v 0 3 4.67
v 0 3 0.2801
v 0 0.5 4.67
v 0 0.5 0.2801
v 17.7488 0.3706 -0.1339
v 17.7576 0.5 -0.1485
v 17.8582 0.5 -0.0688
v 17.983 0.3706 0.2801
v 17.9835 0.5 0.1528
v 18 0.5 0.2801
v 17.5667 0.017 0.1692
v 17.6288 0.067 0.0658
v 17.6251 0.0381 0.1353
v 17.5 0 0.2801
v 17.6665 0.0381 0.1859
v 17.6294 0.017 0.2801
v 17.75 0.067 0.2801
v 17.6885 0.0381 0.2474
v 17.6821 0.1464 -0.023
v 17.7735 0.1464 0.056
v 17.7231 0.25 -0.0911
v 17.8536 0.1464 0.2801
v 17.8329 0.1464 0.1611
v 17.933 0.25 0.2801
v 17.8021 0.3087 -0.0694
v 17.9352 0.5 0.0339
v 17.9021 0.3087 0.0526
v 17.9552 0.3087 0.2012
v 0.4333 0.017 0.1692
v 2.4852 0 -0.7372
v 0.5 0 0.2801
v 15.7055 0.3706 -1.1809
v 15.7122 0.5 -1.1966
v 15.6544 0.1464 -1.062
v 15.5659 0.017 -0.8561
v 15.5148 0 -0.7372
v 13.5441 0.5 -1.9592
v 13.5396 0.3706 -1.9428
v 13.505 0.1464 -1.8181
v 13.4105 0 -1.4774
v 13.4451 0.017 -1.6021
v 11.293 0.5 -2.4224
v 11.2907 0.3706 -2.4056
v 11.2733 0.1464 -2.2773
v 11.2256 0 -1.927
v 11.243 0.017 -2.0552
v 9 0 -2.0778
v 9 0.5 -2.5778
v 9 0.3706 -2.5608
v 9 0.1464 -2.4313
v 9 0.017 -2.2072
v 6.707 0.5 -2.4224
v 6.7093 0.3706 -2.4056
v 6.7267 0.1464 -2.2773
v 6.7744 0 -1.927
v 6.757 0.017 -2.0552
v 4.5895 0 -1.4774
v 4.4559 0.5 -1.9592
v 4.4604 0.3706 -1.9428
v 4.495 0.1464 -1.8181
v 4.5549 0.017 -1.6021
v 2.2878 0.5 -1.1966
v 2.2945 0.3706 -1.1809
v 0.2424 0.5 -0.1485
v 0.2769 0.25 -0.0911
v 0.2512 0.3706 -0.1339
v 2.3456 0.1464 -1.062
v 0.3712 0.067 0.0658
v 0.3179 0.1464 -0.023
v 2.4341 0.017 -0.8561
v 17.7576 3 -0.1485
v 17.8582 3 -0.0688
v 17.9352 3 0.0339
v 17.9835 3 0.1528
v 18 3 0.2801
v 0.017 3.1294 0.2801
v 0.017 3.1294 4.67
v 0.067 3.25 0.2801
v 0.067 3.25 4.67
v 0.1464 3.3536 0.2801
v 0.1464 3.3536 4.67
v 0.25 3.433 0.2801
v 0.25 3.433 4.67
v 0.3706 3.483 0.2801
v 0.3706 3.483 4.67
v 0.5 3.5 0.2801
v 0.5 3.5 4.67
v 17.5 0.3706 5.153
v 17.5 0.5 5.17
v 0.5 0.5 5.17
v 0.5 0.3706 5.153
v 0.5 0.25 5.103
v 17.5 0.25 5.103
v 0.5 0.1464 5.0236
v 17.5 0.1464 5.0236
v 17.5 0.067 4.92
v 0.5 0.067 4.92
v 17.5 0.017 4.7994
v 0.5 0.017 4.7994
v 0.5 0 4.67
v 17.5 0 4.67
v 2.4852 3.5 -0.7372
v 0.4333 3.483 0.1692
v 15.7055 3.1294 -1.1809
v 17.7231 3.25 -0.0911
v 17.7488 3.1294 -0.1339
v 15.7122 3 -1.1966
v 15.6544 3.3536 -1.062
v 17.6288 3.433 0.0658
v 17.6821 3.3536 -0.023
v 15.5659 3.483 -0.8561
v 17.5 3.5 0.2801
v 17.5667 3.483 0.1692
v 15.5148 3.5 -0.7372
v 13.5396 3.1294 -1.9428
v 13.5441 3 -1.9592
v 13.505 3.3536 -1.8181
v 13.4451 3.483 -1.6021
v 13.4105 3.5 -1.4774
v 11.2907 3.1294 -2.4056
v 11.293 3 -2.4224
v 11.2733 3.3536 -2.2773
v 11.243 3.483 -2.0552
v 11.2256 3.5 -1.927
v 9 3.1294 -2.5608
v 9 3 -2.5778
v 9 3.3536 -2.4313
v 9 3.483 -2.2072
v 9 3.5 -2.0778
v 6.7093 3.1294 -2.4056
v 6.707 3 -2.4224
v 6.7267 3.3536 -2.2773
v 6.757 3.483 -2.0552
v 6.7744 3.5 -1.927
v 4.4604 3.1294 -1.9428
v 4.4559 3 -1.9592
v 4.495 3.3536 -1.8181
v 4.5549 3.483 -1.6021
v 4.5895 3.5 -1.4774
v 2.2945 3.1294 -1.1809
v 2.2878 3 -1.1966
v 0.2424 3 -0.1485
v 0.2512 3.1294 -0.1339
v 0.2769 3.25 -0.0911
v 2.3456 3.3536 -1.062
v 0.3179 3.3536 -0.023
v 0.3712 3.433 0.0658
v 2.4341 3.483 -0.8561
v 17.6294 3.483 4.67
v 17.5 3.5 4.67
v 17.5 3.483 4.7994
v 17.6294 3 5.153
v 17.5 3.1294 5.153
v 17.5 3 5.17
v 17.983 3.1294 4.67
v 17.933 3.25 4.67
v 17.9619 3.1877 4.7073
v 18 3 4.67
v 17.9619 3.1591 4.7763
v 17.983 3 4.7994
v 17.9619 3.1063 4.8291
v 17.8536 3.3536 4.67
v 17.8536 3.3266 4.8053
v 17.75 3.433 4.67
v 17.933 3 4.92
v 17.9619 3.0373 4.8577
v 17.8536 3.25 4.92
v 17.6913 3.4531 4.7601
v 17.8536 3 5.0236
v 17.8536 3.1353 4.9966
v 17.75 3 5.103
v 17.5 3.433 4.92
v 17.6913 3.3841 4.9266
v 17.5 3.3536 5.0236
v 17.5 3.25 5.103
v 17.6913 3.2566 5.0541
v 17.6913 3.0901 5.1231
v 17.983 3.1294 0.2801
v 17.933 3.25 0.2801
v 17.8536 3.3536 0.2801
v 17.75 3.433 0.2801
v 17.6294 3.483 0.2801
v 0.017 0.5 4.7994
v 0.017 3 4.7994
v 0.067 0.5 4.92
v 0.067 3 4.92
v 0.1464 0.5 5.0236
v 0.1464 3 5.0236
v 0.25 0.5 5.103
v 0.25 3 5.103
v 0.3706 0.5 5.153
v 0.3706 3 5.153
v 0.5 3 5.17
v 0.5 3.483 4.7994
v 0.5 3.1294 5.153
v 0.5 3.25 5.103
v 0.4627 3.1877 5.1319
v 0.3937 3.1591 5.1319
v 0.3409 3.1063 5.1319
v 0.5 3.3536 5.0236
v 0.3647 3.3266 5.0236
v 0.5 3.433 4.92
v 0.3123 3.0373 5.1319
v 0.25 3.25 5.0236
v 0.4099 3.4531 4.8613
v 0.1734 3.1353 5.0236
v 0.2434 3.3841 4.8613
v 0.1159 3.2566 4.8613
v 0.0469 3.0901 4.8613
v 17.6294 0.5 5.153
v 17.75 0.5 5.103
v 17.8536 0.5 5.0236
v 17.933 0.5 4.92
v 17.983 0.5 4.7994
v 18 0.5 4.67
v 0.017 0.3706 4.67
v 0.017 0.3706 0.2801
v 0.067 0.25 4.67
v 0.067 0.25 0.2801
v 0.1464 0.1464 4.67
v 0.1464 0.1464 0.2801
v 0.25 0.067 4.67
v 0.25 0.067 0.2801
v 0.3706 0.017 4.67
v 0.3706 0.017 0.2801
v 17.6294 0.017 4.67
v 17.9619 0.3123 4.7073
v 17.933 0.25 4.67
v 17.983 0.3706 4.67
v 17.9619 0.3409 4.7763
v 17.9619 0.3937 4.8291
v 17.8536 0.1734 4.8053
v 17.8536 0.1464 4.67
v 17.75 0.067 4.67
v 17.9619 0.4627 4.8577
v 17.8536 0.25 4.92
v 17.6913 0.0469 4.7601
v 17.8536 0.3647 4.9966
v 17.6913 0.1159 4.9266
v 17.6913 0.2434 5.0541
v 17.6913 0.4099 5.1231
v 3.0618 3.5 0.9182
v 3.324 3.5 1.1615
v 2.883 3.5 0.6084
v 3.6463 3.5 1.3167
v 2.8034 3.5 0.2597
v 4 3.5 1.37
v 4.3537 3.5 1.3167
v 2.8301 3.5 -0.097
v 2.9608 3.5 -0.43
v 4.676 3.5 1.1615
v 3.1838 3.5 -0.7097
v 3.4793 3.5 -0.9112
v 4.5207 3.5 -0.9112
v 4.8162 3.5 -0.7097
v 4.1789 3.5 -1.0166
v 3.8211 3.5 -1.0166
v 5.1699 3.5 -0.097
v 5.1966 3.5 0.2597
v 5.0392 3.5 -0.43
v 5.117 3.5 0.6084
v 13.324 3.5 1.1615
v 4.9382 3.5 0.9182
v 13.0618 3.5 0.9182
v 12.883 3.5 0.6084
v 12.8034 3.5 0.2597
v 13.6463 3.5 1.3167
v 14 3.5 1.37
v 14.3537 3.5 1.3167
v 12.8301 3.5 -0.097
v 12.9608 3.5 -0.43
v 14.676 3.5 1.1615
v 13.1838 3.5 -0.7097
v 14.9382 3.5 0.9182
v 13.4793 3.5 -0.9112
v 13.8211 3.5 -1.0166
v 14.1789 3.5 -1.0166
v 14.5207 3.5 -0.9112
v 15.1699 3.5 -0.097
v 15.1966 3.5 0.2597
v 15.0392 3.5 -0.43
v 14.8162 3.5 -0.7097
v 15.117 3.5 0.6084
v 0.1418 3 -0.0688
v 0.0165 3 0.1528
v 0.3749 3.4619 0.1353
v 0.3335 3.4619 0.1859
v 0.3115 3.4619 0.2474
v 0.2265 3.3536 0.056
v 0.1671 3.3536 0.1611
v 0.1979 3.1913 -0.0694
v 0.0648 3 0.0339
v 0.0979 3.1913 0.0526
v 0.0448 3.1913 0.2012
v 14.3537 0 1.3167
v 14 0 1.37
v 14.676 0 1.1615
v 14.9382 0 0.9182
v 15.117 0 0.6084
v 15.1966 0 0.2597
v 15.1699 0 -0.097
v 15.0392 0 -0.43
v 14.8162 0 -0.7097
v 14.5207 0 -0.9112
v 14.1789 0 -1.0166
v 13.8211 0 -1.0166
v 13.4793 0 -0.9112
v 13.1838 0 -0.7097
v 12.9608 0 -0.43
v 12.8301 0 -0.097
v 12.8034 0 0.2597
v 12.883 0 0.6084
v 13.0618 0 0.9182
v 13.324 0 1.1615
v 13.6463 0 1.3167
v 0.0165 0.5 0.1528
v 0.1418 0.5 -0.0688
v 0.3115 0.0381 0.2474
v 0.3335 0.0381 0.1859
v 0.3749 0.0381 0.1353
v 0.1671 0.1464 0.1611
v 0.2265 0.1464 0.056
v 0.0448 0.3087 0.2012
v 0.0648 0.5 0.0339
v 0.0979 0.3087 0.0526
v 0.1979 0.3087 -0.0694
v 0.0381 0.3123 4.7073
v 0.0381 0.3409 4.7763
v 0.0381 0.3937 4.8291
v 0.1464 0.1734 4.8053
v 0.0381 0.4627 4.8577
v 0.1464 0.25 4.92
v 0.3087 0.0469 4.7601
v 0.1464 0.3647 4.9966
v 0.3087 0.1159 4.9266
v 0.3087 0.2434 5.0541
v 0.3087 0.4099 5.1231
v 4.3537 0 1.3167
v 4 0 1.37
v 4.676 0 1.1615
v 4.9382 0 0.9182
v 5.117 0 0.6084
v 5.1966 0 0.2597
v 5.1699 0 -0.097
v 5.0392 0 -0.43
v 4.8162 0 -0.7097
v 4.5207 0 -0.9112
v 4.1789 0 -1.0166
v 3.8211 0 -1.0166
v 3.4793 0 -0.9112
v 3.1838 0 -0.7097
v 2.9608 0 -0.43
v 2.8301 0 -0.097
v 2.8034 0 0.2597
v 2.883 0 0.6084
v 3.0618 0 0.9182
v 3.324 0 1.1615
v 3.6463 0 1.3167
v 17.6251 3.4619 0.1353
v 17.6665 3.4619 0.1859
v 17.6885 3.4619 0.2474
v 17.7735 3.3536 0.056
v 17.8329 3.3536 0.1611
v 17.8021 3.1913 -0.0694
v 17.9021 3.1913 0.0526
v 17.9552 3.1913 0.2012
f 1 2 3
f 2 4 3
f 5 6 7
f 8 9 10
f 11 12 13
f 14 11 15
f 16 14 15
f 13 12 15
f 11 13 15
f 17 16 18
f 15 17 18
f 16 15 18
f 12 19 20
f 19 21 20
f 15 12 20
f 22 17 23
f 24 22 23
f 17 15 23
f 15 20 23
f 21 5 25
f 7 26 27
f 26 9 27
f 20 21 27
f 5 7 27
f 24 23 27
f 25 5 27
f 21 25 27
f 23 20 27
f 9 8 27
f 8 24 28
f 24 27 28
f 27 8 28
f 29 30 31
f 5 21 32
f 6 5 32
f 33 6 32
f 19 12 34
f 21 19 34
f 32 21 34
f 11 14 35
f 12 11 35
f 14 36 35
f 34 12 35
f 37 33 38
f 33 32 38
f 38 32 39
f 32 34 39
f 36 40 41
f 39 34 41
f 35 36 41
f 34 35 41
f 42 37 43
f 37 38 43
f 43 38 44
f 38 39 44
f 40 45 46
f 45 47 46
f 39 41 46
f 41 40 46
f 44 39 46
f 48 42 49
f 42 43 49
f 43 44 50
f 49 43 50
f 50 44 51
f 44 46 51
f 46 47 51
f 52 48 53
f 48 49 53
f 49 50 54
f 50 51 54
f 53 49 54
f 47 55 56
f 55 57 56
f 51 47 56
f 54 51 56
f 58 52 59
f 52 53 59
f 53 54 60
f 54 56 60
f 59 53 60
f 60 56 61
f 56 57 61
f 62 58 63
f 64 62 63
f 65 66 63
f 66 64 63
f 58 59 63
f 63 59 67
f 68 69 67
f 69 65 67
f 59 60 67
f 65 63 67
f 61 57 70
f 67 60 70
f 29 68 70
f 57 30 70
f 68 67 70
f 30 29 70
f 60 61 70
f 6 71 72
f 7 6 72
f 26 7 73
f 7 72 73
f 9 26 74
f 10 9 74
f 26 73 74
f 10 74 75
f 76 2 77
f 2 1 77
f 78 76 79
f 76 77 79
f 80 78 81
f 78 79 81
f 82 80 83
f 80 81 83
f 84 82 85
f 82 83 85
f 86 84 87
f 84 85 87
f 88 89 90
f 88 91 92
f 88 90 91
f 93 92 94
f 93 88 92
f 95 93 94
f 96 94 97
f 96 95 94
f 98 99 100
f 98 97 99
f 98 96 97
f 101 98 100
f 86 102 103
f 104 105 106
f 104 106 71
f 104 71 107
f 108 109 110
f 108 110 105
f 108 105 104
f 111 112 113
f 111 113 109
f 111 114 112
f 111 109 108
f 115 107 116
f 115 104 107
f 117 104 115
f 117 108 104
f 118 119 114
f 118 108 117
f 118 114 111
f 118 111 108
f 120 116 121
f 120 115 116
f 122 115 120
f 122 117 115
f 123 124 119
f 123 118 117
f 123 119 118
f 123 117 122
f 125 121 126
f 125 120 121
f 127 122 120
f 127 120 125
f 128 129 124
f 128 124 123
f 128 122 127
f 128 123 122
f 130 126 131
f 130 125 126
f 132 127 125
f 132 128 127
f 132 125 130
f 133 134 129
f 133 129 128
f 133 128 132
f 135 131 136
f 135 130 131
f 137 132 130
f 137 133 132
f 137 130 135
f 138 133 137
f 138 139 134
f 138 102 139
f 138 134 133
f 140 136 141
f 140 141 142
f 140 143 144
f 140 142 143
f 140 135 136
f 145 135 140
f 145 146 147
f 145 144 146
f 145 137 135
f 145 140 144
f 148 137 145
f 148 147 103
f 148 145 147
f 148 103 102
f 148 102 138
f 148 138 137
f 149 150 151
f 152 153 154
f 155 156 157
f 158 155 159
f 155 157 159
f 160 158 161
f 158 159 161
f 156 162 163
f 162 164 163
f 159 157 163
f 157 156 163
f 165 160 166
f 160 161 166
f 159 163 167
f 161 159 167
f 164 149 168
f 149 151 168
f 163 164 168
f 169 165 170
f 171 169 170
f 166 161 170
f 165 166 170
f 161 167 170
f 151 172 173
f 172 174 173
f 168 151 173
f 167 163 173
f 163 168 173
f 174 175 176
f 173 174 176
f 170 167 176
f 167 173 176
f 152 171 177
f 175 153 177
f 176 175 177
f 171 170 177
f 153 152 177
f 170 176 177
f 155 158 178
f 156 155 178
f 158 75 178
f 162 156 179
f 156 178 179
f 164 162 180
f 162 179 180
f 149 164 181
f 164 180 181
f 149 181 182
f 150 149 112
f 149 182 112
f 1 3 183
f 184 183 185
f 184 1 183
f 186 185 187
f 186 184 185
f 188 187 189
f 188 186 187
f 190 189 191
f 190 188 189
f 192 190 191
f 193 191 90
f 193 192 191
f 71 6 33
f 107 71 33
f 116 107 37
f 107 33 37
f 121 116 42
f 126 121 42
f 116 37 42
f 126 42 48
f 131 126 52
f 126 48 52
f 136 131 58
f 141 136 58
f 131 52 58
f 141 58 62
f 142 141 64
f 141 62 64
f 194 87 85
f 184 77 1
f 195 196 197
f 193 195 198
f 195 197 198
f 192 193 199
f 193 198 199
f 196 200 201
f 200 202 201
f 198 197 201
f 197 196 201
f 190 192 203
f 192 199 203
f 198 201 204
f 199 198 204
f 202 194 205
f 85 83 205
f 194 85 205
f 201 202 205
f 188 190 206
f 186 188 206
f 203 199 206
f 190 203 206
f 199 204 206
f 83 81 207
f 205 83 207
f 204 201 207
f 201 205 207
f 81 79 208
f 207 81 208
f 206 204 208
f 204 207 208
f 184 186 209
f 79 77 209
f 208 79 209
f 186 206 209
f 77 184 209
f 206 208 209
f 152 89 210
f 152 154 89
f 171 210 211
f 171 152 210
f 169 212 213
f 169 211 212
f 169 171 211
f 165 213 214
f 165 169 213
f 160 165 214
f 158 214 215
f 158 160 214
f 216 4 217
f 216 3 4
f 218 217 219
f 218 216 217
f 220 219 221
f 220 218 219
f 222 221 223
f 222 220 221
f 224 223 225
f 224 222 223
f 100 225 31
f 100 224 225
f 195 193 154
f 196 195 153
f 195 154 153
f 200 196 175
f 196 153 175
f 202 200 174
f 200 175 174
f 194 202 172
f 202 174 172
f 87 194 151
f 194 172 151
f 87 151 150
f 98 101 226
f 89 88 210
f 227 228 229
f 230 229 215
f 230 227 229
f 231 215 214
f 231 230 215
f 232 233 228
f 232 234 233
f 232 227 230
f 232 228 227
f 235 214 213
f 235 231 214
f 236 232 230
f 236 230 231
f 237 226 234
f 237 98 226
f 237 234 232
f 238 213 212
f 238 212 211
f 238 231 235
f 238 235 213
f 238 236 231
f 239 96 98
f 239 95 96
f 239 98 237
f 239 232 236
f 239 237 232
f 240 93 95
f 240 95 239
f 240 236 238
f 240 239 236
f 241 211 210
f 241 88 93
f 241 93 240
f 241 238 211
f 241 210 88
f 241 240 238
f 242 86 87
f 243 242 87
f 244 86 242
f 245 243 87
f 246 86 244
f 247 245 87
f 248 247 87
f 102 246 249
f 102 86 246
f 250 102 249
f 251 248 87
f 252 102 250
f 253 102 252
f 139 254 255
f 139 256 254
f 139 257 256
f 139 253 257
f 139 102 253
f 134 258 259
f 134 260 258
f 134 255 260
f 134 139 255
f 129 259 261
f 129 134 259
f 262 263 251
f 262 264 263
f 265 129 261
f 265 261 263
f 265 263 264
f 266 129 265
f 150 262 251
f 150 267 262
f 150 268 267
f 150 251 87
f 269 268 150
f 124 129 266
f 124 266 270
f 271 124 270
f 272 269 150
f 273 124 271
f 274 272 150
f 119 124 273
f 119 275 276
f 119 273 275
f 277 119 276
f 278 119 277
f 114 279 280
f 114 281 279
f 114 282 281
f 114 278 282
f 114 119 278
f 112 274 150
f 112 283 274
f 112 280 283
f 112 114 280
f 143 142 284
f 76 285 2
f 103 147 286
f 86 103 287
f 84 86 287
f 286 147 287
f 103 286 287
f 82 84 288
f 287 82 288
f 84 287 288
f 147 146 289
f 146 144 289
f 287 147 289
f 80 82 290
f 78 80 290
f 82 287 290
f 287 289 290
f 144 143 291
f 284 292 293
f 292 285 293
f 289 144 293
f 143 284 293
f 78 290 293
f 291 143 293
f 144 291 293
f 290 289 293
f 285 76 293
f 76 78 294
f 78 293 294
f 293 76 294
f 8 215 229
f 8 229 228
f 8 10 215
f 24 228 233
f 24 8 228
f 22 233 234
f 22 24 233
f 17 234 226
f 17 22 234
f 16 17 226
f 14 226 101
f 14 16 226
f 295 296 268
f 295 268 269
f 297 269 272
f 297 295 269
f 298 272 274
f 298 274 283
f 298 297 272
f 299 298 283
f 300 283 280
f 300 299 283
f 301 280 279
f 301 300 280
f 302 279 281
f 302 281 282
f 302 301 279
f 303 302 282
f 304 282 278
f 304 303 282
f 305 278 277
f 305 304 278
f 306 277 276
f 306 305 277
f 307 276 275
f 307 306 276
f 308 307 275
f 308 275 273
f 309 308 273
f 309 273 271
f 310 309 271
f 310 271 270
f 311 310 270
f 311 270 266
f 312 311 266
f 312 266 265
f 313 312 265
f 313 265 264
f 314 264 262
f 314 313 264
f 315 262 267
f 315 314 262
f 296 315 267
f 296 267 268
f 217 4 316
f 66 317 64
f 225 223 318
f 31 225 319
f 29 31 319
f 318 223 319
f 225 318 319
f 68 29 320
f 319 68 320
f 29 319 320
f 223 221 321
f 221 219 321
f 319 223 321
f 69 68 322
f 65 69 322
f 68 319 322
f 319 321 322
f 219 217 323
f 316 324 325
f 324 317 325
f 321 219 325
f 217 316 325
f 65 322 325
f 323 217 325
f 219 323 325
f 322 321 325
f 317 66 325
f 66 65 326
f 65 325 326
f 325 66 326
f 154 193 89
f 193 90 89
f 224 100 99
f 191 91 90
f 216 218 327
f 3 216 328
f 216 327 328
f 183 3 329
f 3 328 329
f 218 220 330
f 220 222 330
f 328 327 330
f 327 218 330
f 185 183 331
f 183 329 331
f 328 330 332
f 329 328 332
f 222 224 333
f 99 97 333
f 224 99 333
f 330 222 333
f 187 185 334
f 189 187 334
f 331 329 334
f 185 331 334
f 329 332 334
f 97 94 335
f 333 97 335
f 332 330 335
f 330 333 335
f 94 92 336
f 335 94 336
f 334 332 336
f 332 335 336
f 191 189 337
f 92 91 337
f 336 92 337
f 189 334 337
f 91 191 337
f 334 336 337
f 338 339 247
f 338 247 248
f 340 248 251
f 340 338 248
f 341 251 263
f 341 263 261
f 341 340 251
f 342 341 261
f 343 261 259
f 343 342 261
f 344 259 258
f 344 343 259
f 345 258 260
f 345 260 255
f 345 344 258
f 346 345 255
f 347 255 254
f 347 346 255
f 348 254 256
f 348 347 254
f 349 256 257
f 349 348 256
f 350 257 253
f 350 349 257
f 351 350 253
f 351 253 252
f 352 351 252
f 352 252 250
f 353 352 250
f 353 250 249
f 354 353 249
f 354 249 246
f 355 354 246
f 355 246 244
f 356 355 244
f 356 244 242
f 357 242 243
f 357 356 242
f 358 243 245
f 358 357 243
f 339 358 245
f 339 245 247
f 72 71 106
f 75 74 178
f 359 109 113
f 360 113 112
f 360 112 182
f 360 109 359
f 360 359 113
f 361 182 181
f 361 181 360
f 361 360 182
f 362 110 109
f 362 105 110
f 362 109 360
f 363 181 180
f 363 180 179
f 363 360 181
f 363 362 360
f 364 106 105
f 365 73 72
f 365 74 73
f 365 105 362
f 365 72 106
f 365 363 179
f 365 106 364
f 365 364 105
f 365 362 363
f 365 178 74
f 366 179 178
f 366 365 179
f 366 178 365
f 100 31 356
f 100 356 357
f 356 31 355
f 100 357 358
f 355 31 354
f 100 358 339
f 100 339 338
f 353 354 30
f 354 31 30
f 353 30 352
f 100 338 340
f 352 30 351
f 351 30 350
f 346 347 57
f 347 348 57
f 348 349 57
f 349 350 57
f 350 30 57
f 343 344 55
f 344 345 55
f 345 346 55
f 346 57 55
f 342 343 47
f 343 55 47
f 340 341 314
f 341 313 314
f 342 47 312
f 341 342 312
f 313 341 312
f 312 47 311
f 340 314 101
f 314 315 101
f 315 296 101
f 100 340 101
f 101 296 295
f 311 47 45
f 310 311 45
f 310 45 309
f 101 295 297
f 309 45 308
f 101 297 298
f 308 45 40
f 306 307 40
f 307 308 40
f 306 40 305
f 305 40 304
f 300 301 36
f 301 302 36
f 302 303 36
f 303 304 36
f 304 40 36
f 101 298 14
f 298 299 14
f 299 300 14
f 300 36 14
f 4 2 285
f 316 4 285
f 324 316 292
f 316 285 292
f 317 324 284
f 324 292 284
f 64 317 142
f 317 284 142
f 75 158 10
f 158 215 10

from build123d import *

# Parameters (mm, degrees)
SKETCH1_R           = 1.2
BOSS_EXTRUDE1_DEPTH = 3.5
FILLET1_R           = 0.5


with BuildPart() as part:
    # Sketch1 → Boss-Extrude1 (new body)
    with BuildSketch(Plane(origin=(0, 0, 0), x_dir=(1, 0, 0), z_dir=(0, 1, 0))):
        with BuildLine():
            Line((0, 0), (0, -5.17))
            Line((0, -5.17), (18, -5.17))
            Line((18, -5.17), (18, 0))
            ThreePointArc((18, 0), (9, 2.577794898), (0, 0))
        make_face()
        with Locations(Location((4, -0.17, 0), (0, 0, 270))):
            Circle(SKETCH1_R, mode=Mode.SUBTRACT)
        with Locations(Location((14, -0.17, 0), (0, 0, 270))):
            Circle(SKETCH1_R, mode=Mode.SUBTRACT)
    extrude(amount=BOSS_EXTRUDE1_DEPTH)

    # Fillet1
    fillet1_edges = [part.edges().sort_by_distance(p)[0] for p in [
        (0, 3.5, 2.585),
        (9, 3.5, 5.17),
        (18, 3.5, 2.585),
        (9, 0, 5.17),
        (0, 0, 2.585),
        (9, 0, -2.577794898),
        (18, 0, 2.585),
        (18, 1.75, 5.17),
        (0, 1.75, 5.17),
        (0, 1.75, 0),
        (18, 1.75, 0),
        (9, 3.5, -2.577794898),
    ]]
    fillet(fillet1_edges, radius=FILLET1_R)


solid = part.part
